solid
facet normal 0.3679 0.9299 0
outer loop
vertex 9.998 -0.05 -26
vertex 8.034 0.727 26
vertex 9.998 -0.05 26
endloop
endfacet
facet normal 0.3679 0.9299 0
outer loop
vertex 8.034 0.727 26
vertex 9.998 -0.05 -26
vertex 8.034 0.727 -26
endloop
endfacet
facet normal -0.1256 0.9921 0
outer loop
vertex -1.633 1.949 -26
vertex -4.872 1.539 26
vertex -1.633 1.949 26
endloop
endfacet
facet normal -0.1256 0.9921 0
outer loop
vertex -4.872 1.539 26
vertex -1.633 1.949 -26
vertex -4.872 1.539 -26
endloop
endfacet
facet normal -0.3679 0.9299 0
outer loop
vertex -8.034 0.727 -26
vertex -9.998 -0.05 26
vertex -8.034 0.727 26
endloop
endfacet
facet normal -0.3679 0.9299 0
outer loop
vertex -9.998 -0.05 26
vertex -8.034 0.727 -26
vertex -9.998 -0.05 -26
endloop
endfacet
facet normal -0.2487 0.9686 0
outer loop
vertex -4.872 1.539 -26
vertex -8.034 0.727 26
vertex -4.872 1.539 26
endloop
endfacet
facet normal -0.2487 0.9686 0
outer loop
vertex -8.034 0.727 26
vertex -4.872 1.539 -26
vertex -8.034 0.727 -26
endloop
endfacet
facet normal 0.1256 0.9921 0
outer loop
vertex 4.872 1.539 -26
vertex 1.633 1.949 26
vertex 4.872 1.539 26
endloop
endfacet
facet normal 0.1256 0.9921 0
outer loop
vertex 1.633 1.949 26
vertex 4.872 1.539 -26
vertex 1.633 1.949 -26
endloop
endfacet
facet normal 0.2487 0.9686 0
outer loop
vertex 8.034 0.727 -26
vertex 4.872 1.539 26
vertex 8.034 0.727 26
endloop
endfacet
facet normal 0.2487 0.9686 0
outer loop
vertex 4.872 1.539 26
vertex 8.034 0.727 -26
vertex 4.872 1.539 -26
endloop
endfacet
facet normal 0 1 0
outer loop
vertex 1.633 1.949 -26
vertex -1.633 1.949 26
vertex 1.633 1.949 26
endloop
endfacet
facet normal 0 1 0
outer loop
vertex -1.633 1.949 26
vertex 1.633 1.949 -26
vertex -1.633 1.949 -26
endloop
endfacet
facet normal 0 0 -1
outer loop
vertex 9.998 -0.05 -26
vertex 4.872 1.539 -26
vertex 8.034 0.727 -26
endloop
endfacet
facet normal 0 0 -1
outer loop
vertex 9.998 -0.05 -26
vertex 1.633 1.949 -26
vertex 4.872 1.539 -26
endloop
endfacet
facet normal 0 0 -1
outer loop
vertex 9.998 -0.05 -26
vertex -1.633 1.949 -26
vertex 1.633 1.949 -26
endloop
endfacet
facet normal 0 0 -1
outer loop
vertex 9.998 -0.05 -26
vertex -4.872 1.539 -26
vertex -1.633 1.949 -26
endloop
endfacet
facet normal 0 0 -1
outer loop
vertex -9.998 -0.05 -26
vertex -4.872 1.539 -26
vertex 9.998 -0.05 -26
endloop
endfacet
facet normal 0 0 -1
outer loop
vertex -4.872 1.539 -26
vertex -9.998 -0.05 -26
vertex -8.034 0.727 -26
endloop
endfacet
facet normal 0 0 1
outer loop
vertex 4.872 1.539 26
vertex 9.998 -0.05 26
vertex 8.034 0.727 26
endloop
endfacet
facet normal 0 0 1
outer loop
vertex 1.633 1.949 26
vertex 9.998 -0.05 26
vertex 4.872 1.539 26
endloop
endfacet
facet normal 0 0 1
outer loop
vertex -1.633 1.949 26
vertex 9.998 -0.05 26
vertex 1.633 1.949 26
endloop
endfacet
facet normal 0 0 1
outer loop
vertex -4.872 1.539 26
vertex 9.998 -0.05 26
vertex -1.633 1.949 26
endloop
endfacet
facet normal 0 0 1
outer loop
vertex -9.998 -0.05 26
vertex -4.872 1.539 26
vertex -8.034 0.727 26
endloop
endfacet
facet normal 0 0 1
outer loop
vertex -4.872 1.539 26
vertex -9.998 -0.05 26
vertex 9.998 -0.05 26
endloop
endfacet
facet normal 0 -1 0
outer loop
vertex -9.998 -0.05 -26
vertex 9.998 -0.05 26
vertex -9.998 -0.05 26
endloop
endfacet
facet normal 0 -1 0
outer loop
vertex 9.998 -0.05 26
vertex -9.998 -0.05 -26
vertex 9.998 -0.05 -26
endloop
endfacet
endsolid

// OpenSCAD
helpText="flute(width=20,height=50,depth=2)";

flute(width=20,height=50,depth=2);
flute(help=true);
module flute(width=20,height=50,depth=2,help=false,center=true){
    $fn=50;
    R=(width*width)/(8*depth)+depth/2;
    if(help)echo(helpText);
    translate([0,depth-R,0])
    difference(){
        cylinder(h=height+2,r=R,center=true);
        translate([0,-(depth+0.05),0])cube([2*R,2*R,height+4],center=true);
    }
}
